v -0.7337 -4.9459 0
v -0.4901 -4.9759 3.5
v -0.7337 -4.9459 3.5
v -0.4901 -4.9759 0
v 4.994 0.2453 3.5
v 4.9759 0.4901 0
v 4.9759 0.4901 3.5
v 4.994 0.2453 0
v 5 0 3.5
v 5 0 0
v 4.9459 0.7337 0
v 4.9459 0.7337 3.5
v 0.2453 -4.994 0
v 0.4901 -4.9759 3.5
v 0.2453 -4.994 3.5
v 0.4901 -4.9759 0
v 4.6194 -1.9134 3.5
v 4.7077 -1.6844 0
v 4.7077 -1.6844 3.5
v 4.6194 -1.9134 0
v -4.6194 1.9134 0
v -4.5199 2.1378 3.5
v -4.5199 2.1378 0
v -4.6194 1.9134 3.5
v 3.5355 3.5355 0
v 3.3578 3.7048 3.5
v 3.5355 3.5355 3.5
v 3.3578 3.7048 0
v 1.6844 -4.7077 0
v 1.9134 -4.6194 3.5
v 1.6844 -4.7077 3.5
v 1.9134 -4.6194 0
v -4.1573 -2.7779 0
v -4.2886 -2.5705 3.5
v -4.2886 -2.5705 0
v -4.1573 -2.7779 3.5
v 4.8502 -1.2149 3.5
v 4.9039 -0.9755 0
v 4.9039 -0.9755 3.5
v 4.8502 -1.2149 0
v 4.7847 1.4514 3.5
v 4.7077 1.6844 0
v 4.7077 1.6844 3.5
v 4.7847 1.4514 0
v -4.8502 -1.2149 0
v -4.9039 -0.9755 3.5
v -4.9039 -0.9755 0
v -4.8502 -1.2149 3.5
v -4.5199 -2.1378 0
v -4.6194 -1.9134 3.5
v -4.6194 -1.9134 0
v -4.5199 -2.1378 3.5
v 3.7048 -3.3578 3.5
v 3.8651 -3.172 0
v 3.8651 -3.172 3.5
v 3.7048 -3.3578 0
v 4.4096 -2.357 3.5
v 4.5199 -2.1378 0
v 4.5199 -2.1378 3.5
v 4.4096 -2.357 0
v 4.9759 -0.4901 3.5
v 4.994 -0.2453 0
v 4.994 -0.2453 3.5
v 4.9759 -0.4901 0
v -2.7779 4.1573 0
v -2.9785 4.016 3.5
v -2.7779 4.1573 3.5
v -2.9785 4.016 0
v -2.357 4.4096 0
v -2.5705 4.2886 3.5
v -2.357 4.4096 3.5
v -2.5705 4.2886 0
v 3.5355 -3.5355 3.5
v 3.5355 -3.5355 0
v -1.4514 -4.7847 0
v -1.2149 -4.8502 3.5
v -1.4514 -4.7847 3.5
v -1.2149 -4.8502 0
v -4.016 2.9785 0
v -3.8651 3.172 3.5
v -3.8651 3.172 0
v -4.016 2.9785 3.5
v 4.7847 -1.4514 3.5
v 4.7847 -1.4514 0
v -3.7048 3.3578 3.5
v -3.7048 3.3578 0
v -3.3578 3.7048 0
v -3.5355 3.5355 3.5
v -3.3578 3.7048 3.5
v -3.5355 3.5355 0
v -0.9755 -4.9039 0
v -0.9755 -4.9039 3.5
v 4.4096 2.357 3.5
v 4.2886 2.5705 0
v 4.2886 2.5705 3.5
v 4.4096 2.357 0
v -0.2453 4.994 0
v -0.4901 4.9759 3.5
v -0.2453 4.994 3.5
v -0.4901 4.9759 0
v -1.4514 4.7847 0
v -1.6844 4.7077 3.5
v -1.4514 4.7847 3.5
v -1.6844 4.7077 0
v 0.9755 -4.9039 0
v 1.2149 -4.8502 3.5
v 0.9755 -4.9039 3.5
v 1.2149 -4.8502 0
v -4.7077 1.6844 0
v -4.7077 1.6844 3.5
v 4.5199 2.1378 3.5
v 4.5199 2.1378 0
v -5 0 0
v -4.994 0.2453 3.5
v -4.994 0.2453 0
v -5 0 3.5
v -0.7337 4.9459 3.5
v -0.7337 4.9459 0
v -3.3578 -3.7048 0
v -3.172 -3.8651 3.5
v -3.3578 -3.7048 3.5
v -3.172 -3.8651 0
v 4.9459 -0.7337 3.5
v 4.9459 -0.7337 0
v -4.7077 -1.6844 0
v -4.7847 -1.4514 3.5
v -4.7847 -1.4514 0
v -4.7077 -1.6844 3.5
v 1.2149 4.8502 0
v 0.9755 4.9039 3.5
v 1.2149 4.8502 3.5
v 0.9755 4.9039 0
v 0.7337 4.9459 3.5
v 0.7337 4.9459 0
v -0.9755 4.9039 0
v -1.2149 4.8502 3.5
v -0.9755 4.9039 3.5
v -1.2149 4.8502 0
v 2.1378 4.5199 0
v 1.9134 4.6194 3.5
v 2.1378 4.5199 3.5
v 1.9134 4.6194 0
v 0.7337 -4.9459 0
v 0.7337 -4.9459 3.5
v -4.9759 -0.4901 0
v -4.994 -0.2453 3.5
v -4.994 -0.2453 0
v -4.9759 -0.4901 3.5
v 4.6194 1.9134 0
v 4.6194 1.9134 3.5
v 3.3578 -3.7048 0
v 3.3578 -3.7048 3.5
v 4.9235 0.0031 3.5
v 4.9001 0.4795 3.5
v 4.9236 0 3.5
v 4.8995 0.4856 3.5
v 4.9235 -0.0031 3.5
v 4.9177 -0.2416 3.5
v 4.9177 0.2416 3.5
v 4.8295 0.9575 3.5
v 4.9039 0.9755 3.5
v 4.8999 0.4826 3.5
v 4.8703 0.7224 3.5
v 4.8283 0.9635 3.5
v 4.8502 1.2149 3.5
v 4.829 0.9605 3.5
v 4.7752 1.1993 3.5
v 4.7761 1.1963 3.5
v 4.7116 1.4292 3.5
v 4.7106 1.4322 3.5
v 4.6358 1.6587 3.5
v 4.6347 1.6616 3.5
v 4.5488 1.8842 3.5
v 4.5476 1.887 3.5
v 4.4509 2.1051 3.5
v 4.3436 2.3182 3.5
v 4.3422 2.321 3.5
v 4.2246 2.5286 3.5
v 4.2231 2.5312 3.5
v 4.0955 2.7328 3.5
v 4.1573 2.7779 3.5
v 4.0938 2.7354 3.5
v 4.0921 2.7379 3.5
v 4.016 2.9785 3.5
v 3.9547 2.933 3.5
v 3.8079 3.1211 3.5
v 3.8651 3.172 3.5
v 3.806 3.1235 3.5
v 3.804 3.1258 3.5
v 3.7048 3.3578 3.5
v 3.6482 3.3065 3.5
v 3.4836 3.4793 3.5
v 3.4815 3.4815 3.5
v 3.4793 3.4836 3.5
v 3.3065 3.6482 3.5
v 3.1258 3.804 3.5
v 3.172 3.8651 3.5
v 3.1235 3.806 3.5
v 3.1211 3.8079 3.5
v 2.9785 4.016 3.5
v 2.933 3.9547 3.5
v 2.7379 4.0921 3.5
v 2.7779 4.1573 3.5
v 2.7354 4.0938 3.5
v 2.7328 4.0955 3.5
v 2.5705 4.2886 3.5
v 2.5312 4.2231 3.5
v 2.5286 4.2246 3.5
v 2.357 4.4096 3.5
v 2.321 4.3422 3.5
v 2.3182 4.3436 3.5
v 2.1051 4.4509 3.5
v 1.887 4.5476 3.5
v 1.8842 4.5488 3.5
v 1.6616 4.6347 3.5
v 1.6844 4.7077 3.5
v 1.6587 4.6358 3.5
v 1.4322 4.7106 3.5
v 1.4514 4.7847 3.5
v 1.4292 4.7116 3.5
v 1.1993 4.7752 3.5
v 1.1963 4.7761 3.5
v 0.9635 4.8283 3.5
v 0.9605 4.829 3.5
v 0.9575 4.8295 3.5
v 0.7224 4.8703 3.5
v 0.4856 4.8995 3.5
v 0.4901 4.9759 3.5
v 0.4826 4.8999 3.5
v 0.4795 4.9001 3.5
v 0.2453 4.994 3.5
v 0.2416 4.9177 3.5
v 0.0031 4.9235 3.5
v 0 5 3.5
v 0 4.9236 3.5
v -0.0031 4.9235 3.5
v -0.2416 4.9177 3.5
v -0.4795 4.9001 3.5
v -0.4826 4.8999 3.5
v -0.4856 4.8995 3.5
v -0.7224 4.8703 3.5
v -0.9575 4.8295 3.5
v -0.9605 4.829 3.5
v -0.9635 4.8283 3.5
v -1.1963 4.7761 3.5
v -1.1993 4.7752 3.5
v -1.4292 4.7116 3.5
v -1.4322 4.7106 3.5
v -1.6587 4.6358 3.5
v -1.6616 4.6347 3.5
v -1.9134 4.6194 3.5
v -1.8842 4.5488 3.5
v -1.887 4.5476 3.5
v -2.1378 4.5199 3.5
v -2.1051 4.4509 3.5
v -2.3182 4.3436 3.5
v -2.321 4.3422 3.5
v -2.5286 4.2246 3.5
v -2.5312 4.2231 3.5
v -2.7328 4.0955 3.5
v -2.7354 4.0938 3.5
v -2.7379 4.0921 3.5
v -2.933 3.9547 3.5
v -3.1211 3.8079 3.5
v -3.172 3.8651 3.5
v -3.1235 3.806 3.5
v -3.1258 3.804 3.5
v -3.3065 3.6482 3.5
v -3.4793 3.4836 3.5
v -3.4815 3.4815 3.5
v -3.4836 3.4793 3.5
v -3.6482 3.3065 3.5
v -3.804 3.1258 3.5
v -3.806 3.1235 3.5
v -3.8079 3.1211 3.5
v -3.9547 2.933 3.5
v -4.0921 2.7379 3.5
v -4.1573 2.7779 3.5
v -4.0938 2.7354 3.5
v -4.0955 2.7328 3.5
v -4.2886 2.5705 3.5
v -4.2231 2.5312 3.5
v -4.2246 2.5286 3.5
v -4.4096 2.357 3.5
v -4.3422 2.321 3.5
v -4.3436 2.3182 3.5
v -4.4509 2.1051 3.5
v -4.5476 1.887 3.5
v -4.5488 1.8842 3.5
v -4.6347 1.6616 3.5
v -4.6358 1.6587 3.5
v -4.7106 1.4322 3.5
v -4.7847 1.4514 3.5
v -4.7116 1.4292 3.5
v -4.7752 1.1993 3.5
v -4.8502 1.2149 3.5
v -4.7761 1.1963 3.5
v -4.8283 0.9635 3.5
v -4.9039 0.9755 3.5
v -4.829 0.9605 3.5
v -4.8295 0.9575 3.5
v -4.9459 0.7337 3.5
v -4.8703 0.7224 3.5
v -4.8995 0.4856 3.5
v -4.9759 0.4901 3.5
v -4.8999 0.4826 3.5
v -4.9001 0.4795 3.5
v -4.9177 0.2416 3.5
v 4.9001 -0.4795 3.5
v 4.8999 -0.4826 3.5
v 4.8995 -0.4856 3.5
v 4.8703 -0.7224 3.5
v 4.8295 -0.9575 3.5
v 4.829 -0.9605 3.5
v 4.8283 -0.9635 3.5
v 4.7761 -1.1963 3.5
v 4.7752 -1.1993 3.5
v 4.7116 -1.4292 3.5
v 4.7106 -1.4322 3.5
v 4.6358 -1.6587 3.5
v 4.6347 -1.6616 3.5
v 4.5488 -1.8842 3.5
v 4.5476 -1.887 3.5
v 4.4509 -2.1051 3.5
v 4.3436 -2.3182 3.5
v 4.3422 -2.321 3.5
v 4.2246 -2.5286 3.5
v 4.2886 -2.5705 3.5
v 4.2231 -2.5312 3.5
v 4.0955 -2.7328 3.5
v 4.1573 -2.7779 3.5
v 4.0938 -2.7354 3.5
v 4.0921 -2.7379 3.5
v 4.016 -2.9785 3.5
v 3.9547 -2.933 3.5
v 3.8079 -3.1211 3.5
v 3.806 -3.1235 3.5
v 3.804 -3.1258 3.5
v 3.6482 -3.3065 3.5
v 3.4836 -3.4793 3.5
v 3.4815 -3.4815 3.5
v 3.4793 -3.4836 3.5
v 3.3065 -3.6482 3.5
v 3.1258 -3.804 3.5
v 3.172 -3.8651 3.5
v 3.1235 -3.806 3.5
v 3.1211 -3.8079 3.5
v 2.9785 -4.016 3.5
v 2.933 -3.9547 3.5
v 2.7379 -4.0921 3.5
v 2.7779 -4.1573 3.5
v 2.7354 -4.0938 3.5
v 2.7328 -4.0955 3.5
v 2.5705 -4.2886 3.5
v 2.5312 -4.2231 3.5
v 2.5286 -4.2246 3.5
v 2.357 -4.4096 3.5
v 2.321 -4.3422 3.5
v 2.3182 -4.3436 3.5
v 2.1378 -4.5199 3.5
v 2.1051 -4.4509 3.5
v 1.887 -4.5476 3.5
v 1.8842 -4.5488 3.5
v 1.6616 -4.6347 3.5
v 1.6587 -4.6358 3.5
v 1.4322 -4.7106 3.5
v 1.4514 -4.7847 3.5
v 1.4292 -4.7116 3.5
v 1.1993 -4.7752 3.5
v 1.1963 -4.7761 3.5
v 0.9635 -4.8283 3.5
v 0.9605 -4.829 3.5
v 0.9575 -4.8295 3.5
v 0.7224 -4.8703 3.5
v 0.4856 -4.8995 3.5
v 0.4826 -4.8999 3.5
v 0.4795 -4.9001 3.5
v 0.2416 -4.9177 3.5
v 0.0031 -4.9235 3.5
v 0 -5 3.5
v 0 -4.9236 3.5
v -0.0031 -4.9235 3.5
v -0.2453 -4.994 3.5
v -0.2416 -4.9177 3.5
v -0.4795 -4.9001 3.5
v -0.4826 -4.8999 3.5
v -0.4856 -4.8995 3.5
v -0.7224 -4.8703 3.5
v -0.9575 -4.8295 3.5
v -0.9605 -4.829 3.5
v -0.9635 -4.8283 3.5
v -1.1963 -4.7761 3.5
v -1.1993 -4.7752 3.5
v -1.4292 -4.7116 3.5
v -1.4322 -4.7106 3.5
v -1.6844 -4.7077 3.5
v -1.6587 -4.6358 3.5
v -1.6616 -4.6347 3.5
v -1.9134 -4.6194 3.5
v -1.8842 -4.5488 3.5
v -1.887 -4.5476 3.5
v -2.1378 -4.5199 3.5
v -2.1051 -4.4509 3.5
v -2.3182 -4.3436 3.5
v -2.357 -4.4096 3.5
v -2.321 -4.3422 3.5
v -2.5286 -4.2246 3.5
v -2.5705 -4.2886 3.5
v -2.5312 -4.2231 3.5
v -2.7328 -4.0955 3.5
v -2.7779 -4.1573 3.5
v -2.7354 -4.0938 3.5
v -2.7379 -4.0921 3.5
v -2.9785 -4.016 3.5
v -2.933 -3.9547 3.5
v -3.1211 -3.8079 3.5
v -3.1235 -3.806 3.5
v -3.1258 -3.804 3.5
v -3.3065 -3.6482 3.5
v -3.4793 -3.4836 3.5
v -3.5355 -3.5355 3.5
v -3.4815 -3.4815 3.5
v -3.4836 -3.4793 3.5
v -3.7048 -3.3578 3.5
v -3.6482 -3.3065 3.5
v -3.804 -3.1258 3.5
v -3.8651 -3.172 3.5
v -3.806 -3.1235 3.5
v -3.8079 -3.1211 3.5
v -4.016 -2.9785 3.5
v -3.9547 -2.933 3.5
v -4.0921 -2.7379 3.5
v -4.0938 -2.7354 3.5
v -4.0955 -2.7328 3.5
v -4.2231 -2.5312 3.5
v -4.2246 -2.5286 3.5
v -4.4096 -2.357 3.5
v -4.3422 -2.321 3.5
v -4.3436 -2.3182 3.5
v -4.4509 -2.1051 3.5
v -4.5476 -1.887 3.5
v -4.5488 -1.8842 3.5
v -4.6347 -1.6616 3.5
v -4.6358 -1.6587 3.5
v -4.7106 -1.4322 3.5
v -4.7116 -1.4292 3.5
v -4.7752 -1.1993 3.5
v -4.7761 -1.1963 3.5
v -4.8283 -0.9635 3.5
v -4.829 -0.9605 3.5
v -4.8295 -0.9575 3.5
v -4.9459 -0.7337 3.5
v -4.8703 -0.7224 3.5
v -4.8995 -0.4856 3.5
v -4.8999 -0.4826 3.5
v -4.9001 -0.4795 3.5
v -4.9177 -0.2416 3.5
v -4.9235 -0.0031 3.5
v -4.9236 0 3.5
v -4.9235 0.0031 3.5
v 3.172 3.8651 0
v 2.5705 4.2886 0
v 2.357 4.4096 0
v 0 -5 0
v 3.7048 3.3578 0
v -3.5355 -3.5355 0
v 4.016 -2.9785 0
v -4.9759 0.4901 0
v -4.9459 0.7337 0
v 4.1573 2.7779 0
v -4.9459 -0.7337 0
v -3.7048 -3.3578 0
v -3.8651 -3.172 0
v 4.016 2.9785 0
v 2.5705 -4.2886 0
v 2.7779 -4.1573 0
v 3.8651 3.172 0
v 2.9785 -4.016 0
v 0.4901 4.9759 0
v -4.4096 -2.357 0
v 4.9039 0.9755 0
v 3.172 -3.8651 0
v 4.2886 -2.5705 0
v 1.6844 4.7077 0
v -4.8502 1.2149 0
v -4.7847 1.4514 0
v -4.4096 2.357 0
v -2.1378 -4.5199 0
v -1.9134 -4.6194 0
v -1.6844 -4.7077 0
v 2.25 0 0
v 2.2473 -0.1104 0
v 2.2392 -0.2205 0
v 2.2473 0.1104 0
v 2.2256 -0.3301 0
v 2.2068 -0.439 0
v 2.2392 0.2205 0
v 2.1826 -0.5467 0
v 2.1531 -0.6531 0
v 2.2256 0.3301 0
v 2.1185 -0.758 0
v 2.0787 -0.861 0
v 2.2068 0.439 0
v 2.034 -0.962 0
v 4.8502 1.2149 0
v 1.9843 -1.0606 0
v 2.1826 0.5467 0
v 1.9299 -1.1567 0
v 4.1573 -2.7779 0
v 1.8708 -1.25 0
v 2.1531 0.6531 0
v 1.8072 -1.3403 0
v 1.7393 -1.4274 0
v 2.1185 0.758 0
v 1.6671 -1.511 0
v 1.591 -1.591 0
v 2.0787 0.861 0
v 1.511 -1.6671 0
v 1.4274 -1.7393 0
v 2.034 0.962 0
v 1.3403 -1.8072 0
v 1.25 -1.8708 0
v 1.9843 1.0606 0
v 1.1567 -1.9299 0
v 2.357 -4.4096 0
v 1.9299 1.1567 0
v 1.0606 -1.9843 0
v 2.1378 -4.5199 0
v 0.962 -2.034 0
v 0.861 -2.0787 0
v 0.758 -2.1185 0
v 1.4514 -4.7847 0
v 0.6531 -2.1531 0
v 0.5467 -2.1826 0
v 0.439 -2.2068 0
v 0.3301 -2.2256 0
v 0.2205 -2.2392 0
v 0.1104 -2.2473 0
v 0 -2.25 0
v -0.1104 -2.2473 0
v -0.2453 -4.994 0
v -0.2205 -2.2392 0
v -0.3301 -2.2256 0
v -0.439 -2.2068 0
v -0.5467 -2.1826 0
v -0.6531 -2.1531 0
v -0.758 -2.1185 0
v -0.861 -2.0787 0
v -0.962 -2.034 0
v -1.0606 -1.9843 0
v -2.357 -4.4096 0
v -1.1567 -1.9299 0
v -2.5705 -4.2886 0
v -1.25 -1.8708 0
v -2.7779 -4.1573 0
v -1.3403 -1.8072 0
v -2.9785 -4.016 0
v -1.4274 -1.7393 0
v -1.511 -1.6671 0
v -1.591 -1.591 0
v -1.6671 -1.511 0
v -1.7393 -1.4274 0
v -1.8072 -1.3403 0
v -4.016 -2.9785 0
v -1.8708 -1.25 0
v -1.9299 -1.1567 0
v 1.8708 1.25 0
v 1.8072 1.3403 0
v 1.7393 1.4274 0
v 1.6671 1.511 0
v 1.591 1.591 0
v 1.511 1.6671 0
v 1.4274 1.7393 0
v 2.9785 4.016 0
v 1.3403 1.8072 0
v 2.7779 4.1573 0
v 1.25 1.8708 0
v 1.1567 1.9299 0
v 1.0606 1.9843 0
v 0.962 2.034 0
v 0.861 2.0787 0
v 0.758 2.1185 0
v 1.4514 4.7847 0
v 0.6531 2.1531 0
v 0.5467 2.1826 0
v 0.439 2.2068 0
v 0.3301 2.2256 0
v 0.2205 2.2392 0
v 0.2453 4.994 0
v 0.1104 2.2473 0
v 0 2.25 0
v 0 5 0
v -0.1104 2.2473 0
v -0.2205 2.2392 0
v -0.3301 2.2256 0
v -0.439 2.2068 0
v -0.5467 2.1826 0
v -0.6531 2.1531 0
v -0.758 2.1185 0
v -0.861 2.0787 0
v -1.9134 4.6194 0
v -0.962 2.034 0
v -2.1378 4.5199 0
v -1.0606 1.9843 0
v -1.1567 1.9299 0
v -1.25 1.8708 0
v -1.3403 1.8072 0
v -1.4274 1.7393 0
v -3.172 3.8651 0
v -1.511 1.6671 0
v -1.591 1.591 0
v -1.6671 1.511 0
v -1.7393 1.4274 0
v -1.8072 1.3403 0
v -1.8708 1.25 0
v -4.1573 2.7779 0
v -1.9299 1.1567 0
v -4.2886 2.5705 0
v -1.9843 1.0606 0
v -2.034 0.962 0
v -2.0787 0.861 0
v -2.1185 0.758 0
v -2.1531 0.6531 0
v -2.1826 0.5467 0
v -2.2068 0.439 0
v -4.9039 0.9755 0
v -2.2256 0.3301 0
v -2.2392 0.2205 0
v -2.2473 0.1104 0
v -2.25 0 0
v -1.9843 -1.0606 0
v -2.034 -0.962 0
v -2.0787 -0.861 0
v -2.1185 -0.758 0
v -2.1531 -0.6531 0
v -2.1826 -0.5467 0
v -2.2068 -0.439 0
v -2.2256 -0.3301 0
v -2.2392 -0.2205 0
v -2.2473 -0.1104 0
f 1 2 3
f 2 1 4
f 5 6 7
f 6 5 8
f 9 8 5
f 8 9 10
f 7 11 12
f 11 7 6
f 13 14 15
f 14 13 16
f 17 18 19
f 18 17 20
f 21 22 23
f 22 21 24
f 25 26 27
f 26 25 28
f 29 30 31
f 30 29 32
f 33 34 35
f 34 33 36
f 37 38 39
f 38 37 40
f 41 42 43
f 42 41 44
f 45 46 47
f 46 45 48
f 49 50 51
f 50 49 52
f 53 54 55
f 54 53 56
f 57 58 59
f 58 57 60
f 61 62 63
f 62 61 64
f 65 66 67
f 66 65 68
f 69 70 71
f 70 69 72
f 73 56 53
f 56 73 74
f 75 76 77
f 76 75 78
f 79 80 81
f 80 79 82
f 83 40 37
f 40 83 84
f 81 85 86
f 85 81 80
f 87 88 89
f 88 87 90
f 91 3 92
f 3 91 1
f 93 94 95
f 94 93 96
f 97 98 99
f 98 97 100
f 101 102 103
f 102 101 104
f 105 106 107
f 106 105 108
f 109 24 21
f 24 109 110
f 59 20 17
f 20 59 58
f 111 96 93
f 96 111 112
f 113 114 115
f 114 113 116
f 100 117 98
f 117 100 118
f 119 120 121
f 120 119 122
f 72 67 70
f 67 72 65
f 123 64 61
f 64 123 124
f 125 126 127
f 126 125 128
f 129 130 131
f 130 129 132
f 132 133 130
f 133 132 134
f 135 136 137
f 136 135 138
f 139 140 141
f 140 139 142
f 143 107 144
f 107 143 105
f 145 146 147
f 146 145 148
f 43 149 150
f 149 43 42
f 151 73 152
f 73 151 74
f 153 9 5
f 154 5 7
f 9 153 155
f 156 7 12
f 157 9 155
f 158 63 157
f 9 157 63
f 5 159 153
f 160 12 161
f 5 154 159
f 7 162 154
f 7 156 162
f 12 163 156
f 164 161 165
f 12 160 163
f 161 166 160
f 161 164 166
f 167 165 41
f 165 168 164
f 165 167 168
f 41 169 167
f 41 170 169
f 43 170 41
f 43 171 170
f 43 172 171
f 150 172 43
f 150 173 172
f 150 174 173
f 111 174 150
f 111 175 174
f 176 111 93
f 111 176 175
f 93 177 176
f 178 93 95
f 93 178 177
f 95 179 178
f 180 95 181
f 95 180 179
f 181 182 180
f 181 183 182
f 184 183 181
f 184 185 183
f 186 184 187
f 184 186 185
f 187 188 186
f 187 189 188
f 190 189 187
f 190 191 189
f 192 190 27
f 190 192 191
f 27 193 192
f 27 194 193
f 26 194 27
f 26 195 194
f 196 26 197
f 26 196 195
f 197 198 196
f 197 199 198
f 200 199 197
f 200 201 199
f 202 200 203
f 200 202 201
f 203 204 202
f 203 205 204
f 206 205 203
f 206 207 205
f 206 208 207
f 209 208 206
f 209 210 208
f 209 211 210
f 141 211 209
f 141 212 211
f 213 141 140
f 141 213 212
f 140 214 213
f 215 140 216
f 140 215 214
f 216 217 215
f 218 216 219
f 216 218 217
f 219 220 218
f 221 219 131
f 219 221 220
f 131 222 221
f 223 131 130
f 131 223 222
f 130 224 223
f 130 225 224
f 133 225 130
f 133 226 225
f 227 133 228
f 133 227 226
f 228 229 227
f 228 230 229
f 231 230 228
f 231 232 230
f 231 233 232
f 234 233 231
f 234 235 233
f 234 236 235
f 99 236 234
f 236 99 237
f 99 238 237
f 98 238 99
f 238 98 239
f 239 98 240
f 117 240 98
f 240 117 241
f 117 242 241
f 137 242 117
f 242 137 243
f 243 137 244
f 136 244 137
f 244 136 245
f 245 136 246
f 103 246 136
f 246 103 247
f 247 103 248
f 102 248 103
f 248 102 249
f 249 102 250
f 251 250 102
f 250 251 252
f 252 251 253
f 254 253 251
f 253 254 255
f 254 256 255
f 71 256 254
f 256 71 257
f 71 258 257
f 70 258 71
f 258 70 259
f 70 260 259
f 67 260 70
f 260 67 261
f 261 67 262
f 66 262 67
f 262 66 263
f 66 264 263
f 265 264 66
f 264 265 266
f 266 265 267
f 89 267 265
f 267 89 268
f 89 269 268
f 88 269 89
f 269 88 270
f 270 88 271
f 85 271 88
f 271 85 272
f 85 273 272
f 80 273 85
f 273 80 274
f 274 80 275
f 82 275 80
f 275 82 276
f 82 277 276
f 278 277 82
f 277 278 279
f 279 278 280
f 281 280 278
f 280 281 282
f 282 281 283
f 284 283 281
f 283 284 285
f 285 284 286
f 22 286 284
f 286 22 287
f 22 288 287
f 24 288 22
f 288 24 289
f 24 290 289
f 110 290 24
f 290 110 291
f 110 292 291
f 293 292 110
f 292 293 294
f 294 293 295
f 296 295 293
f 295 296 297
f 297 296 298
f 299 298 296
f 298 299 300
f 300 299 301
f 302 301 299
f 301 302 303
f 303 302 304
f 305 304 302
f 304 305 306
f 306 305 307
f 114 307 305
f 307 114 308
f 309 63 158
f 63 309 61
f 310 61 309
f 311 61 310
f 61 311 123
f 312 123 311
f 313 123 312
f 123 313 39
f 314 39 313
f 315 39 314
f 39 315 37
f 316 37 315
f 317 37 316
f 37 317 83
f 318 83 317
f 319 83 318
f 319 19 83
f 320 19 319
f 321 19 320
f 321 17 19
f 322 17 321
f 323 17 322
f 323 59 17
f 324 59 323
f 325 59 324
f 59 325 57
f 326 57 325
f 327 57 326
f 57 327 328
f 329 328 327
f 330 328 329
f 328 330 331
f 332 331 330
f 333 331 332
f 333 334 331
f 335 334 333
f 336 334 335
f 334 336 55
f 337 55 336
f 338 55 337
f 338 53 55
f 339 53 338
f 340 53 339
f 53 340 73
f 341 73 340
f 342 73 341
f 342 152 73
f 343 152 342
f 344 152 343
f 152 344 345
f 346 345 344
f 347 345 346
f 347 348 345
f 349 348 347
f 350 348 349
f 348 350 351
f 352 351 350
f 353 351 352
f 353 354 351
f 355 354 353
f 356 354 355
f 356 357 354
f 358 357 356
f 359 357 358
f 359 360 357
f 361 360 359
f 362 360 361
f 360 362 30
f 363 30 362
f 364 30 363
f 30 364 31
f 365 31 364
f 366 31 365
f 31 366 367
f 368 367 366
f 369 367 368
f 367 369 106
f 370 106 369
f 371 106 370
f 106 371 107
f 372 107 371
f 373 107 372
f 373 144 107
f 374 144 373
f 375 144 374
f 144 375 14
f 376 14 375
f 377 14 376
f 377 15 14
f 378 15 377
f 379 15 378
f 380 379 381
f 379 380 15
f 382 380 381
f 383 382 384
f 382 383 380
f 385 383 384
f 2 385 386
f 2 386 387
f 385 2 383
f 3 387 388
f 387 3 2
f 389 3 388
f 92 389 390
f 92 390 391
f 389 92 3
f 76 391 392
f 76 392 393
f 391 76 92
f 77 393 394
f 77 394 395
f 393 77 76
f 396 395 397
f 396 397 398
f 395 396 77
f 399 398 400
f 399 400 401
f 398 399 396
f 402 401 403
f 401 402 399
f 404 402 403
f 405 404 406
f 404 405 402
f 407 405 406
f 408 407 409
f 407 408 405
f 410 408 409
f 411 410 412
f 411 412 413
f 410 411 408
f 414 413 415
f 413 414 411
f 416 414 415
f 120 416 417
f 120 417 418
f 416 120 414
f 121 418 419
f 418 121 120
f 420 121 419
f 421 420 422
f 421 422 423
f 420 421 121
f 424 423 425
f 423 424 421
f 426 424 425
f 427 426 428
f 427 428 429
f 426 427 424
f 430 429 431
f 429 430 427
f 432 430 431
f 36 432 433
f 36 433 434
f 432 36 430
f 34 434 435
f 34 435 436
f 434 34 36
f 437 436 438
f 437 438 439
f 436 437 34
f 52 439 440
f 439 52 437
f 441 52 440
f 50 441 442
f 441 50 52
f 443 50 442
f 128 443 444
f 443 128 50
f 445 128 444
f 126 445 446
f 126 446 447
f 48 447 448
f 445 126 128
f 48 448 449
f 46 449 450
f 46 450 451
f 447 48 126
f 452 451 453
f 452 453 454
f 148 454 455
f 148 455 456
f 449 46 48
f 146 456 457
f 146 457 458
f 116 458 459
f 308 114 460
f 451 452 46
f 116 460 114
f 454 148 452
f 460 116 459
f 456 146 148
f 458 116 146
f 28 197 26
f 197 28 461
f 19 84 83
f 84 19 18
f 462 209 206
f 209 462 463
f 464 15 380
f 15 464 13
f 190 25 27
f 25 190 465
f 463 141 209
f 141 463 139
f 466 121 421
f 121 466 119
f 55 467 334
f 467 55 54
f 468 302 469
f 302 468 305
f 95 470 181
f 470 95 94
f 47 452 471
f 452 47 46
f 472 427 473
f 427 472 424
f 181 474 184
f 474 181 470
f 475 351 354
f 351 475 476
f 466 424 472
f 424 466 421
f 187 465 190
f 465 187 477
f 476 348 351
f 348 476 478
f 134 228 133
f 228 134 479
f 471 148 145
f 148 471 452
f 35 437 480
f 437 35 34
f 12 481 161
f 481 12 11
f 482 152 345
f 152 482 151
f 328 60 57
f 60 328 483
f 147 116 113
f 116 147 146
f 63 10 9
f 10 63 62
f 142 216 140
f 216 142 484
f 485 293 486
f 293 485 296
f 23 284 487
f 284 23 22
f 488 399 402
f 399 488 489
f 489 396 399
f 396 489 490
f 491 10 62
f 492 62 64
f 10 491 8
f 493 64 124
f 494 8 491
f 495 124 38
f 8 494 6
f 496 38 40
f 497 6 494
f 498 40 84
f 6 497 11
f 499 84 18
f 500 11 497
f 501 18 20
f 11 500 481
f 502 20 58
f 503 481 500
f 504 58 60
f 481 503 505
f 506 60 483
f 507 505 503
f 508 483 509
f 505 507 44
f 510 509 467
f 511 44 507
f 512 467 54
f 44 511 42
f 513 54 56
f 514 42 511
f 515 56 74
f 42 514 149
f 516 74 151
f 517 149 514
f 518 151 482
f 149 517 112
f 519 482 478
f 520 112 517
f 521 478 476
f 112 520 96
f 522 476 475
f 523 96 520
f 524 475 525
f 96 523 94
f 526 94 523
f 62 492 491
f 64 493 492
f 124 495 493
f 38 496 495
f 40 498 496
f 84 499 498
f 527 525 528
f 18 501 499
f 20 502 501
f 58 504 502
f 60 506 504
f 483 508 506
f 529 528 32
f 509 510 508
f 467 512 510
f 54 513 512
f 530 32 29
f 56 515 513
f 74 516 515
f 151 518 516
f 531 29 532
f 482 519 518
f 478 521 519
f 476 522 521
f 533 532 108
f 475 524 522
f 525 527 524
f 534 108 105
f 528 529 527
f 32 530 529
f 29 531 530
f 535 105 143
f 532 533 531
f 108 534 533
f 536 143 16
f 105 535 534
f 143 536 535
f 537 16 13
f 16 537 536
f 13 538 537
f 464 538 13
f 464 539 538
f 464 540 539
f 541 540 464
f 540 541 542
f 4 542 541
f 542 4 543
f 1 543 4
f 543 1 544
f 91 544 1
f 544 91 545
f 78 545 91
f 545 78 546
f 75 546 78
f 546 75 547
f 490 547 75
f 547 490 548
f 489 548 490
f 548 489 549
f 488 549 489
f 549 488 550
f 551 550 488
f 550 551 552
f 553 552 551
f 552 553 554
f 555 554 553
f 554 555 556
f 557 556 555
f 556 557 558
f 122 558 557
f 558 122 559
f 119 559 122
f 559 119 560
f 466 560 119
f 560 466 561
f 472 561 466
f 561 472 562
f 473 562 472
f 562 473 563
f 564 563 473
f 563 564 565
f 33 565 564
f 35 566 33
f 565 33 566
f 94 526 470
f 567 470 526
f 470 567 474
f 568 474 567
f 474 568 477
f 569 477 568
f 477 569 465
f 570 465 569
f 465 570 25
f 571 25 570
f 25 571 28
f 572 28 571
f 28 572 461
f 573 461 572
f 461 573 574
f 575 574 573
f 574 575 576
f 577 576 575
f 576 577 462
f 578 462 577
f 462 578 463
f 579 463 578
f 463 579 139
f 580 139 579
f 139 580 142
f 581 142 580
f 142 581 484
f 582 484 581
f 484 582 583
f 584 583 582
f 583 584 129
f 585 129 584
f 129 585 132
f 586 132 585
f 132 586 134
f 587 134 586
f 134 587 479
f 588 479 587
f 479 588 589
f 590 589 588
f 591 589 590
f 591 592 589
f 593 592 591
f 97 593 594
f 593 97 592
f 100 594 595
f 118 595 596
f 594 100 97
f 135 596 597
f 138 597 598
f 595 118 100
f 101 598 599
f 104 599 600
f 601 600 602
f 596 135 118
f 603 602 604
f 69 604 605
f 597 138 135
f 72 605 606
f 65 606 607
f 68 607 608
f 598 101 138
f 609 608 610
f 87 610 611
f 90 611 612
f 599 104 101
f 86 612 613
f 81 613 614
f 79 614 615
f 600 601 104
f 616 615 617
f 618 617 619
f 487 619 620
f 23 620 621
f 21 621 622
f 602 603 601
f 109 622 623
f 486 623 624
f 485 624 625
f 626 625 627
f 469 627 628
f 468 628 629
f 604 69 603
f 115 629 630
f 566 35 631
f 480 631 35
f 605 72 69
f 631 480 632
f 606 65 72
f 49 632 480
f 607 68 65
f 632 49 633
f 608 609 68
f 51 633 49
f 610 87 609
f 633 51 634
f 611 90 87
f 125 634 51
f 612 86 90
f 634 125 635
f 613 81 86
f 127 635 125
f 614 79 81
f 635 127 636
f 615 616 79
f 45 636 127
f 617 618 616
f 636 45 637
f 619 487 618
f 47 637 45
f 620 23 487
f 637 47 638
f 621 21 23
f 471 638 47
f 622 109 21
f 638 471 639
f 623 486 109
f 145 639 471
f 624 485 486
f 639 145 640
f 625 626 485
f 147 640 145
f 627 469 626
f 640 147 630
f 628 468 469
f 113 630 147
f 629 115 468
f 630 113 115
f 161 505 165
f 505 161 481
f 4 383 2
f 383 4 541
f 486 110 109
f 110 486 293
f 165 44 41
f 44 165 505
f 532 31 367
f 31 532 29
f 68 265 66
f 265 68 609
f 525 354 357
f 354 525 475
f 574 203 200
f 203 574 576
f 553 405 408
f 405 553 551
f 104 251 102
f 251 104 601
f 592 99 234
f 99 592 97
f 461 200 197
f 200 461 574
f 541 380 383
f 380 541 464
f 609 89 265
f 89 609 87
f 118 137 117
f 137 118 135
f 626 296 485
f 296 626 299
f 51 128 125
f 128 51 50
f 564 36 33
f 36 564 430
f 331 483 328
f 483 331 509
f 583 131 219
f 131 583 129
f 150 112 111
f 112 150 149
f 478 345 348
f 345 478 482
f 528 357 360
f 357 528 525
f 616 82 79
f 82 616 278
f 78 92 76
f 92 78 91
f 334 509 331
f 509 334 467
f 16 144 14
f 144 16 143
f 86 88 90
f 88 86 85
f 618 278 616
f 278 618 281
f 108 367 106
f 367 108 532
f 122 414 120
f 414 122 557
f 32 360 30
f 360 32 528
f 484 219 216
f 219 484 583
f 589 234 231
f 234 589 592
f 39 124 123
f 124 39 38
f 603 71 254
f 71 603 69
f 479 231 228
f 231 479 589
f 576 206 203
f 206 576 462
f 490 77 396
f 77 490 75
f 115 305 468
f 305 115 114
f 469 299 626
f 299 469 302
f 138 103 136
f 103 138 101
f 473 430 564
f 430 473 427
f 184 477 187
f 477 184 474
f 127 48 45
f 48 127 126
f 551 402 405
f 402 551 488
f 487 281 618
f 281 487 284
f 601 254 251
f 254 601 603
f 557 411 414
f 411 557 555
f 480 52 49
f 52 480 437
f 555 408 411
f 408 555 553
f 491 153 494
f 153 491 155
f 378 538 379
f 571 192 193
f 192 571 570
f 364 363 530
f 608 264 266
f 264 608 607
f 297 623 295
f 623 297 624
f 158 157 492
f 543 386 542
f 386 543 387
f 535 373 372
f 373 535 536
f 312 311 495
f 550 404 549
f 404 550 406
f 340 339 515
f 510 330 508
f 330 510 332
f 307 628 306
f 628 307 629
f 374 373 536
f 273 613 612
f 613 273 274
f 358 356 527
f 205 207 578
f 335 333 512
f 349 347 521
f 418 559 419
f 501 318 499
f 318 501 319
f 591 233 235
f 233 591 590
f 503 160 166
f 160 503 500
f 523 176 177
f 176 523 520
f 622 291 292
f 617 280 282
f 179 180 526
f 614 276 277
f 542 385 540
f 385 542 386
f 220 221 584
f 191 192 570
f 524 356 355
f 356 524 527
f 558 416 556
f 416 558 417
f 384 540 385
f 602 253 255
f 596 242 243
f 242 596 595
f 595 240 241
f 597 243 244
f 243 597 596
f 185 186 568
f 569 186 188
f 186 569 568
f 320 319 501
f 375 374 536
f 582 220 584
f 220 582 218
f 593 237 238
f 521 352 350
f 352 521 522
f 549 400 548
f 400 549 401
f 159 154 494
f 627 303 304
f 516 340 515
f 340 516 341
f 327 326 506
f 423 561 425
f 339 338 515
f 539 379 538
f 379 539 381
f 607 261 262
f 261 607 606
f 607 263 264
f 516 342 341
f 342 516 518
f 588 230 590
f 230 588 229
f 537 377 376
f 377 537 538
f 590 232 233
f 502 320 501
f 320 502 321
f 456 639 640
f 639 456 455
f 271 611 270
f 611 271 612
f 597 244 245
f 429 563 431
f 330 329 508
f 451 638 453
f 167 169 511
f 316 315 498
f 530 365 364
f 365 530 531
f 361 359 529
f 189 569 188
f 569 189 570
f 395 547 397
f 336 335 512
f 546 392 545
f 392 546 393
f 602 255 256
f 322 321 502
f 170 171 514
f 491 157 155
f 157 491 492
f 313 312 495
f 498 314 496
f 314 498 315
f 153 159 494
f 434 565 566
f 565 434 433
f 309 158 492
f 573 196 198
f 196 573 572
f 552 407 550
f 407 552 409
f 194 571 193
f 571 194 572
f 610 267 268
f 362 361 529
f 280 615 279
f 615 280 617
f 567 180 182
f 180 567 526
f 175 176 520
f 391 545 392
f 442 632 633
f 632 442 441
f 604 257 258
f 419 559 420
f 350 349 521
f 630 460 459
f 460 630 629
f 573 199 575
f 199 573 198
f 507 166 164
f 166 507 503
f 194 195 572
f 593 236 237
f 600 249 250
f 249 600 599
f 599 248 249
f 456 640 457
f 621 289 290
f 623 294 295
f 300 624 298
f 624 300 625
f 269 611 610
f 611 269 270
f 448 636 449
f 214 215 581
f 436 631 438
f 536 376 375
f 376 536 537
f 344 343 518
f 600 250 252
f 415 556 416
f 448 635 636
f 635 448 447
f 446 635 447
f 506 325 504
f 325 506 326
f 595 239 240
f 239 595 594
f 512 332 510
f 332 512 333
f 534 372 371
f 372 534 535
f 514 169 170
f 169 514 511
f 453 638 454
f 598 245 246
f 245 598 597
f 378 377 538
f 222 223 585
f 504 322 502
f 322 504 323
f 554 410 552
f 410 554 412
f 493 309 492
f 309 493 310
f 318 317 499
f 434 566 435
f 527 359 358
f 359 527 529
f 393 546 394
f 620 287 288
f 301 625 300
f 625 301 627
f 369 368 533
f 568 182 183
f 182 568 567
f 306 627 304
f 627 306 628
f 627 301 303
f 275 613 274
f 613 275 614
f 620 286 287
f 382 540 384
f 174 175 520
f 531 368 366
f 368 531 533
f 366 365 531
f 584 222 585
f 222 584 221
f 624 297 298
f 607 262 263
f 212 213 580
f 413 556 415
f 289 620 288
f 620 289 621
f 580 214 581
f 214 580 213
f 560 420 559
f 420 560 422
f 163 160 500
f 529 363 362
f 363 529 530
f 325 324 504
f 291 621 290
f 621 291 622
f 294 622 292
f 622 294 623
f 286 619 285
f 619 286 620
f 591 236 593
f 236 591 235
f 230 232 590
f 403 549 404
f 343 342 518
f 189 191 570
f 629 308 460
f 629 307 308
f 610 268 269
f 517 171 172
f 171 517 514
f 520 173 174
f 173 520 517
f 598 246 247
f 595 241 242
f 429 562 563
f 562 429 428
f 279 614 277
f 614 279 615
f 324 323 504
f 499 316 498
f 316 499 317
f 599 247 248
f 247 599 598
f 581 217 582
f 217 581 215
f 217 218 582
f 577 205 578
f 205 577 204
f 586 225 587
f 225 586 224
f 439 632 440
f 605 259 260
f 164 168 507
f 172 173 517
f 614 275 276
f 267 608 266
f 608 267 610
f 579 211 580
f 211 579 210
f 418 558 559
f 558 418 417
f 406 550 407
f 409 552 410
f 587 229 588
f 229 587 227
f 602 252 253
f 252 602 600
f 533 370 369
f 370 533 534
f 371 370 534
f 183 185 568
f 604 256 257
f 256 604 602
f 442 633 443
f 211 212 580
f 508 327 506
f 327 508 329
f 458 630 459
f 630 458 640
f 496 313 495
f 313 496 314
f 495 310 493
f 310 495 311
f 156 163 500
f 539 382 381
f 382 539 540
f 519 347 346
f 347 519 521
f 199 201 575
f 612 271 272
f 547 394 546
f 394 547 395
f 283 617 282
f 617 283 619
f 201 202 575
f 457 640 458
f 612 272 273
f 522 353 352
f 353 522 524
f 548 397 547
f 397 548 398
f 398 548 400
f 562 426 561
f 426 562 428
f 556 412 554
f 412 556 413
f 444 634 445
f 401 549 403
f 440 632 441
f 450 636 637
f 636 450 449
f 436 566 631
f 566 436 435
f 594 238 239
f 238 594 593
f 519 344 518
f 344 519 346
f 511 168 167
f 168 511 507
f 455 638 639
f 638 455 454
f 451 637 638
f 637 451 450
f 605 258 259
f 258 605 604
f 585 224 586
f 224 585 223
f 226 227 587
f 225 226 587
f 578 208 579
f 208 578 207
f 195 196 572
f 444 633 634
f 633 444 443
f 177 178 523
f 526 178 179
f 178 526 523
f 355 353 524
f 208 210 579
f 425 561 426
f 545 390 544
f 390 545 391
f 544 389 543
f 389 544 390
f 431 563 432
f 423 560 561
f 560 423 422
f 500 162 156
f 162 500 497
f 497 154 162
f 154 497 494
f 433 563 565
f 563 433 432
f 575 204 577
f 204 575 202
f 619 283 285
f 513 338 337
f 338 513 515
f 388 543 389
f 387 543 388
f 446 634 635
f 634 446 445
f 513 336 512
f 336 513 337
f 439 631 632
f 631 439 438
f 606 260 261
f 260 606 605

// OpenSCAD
$fn = 128;

// Conical washer with 10mm outer diameter


difference() {
    cylinder(h=3.5, d=10);
    cylinder(h=3.6, d1=4.5, d2=10);
}
